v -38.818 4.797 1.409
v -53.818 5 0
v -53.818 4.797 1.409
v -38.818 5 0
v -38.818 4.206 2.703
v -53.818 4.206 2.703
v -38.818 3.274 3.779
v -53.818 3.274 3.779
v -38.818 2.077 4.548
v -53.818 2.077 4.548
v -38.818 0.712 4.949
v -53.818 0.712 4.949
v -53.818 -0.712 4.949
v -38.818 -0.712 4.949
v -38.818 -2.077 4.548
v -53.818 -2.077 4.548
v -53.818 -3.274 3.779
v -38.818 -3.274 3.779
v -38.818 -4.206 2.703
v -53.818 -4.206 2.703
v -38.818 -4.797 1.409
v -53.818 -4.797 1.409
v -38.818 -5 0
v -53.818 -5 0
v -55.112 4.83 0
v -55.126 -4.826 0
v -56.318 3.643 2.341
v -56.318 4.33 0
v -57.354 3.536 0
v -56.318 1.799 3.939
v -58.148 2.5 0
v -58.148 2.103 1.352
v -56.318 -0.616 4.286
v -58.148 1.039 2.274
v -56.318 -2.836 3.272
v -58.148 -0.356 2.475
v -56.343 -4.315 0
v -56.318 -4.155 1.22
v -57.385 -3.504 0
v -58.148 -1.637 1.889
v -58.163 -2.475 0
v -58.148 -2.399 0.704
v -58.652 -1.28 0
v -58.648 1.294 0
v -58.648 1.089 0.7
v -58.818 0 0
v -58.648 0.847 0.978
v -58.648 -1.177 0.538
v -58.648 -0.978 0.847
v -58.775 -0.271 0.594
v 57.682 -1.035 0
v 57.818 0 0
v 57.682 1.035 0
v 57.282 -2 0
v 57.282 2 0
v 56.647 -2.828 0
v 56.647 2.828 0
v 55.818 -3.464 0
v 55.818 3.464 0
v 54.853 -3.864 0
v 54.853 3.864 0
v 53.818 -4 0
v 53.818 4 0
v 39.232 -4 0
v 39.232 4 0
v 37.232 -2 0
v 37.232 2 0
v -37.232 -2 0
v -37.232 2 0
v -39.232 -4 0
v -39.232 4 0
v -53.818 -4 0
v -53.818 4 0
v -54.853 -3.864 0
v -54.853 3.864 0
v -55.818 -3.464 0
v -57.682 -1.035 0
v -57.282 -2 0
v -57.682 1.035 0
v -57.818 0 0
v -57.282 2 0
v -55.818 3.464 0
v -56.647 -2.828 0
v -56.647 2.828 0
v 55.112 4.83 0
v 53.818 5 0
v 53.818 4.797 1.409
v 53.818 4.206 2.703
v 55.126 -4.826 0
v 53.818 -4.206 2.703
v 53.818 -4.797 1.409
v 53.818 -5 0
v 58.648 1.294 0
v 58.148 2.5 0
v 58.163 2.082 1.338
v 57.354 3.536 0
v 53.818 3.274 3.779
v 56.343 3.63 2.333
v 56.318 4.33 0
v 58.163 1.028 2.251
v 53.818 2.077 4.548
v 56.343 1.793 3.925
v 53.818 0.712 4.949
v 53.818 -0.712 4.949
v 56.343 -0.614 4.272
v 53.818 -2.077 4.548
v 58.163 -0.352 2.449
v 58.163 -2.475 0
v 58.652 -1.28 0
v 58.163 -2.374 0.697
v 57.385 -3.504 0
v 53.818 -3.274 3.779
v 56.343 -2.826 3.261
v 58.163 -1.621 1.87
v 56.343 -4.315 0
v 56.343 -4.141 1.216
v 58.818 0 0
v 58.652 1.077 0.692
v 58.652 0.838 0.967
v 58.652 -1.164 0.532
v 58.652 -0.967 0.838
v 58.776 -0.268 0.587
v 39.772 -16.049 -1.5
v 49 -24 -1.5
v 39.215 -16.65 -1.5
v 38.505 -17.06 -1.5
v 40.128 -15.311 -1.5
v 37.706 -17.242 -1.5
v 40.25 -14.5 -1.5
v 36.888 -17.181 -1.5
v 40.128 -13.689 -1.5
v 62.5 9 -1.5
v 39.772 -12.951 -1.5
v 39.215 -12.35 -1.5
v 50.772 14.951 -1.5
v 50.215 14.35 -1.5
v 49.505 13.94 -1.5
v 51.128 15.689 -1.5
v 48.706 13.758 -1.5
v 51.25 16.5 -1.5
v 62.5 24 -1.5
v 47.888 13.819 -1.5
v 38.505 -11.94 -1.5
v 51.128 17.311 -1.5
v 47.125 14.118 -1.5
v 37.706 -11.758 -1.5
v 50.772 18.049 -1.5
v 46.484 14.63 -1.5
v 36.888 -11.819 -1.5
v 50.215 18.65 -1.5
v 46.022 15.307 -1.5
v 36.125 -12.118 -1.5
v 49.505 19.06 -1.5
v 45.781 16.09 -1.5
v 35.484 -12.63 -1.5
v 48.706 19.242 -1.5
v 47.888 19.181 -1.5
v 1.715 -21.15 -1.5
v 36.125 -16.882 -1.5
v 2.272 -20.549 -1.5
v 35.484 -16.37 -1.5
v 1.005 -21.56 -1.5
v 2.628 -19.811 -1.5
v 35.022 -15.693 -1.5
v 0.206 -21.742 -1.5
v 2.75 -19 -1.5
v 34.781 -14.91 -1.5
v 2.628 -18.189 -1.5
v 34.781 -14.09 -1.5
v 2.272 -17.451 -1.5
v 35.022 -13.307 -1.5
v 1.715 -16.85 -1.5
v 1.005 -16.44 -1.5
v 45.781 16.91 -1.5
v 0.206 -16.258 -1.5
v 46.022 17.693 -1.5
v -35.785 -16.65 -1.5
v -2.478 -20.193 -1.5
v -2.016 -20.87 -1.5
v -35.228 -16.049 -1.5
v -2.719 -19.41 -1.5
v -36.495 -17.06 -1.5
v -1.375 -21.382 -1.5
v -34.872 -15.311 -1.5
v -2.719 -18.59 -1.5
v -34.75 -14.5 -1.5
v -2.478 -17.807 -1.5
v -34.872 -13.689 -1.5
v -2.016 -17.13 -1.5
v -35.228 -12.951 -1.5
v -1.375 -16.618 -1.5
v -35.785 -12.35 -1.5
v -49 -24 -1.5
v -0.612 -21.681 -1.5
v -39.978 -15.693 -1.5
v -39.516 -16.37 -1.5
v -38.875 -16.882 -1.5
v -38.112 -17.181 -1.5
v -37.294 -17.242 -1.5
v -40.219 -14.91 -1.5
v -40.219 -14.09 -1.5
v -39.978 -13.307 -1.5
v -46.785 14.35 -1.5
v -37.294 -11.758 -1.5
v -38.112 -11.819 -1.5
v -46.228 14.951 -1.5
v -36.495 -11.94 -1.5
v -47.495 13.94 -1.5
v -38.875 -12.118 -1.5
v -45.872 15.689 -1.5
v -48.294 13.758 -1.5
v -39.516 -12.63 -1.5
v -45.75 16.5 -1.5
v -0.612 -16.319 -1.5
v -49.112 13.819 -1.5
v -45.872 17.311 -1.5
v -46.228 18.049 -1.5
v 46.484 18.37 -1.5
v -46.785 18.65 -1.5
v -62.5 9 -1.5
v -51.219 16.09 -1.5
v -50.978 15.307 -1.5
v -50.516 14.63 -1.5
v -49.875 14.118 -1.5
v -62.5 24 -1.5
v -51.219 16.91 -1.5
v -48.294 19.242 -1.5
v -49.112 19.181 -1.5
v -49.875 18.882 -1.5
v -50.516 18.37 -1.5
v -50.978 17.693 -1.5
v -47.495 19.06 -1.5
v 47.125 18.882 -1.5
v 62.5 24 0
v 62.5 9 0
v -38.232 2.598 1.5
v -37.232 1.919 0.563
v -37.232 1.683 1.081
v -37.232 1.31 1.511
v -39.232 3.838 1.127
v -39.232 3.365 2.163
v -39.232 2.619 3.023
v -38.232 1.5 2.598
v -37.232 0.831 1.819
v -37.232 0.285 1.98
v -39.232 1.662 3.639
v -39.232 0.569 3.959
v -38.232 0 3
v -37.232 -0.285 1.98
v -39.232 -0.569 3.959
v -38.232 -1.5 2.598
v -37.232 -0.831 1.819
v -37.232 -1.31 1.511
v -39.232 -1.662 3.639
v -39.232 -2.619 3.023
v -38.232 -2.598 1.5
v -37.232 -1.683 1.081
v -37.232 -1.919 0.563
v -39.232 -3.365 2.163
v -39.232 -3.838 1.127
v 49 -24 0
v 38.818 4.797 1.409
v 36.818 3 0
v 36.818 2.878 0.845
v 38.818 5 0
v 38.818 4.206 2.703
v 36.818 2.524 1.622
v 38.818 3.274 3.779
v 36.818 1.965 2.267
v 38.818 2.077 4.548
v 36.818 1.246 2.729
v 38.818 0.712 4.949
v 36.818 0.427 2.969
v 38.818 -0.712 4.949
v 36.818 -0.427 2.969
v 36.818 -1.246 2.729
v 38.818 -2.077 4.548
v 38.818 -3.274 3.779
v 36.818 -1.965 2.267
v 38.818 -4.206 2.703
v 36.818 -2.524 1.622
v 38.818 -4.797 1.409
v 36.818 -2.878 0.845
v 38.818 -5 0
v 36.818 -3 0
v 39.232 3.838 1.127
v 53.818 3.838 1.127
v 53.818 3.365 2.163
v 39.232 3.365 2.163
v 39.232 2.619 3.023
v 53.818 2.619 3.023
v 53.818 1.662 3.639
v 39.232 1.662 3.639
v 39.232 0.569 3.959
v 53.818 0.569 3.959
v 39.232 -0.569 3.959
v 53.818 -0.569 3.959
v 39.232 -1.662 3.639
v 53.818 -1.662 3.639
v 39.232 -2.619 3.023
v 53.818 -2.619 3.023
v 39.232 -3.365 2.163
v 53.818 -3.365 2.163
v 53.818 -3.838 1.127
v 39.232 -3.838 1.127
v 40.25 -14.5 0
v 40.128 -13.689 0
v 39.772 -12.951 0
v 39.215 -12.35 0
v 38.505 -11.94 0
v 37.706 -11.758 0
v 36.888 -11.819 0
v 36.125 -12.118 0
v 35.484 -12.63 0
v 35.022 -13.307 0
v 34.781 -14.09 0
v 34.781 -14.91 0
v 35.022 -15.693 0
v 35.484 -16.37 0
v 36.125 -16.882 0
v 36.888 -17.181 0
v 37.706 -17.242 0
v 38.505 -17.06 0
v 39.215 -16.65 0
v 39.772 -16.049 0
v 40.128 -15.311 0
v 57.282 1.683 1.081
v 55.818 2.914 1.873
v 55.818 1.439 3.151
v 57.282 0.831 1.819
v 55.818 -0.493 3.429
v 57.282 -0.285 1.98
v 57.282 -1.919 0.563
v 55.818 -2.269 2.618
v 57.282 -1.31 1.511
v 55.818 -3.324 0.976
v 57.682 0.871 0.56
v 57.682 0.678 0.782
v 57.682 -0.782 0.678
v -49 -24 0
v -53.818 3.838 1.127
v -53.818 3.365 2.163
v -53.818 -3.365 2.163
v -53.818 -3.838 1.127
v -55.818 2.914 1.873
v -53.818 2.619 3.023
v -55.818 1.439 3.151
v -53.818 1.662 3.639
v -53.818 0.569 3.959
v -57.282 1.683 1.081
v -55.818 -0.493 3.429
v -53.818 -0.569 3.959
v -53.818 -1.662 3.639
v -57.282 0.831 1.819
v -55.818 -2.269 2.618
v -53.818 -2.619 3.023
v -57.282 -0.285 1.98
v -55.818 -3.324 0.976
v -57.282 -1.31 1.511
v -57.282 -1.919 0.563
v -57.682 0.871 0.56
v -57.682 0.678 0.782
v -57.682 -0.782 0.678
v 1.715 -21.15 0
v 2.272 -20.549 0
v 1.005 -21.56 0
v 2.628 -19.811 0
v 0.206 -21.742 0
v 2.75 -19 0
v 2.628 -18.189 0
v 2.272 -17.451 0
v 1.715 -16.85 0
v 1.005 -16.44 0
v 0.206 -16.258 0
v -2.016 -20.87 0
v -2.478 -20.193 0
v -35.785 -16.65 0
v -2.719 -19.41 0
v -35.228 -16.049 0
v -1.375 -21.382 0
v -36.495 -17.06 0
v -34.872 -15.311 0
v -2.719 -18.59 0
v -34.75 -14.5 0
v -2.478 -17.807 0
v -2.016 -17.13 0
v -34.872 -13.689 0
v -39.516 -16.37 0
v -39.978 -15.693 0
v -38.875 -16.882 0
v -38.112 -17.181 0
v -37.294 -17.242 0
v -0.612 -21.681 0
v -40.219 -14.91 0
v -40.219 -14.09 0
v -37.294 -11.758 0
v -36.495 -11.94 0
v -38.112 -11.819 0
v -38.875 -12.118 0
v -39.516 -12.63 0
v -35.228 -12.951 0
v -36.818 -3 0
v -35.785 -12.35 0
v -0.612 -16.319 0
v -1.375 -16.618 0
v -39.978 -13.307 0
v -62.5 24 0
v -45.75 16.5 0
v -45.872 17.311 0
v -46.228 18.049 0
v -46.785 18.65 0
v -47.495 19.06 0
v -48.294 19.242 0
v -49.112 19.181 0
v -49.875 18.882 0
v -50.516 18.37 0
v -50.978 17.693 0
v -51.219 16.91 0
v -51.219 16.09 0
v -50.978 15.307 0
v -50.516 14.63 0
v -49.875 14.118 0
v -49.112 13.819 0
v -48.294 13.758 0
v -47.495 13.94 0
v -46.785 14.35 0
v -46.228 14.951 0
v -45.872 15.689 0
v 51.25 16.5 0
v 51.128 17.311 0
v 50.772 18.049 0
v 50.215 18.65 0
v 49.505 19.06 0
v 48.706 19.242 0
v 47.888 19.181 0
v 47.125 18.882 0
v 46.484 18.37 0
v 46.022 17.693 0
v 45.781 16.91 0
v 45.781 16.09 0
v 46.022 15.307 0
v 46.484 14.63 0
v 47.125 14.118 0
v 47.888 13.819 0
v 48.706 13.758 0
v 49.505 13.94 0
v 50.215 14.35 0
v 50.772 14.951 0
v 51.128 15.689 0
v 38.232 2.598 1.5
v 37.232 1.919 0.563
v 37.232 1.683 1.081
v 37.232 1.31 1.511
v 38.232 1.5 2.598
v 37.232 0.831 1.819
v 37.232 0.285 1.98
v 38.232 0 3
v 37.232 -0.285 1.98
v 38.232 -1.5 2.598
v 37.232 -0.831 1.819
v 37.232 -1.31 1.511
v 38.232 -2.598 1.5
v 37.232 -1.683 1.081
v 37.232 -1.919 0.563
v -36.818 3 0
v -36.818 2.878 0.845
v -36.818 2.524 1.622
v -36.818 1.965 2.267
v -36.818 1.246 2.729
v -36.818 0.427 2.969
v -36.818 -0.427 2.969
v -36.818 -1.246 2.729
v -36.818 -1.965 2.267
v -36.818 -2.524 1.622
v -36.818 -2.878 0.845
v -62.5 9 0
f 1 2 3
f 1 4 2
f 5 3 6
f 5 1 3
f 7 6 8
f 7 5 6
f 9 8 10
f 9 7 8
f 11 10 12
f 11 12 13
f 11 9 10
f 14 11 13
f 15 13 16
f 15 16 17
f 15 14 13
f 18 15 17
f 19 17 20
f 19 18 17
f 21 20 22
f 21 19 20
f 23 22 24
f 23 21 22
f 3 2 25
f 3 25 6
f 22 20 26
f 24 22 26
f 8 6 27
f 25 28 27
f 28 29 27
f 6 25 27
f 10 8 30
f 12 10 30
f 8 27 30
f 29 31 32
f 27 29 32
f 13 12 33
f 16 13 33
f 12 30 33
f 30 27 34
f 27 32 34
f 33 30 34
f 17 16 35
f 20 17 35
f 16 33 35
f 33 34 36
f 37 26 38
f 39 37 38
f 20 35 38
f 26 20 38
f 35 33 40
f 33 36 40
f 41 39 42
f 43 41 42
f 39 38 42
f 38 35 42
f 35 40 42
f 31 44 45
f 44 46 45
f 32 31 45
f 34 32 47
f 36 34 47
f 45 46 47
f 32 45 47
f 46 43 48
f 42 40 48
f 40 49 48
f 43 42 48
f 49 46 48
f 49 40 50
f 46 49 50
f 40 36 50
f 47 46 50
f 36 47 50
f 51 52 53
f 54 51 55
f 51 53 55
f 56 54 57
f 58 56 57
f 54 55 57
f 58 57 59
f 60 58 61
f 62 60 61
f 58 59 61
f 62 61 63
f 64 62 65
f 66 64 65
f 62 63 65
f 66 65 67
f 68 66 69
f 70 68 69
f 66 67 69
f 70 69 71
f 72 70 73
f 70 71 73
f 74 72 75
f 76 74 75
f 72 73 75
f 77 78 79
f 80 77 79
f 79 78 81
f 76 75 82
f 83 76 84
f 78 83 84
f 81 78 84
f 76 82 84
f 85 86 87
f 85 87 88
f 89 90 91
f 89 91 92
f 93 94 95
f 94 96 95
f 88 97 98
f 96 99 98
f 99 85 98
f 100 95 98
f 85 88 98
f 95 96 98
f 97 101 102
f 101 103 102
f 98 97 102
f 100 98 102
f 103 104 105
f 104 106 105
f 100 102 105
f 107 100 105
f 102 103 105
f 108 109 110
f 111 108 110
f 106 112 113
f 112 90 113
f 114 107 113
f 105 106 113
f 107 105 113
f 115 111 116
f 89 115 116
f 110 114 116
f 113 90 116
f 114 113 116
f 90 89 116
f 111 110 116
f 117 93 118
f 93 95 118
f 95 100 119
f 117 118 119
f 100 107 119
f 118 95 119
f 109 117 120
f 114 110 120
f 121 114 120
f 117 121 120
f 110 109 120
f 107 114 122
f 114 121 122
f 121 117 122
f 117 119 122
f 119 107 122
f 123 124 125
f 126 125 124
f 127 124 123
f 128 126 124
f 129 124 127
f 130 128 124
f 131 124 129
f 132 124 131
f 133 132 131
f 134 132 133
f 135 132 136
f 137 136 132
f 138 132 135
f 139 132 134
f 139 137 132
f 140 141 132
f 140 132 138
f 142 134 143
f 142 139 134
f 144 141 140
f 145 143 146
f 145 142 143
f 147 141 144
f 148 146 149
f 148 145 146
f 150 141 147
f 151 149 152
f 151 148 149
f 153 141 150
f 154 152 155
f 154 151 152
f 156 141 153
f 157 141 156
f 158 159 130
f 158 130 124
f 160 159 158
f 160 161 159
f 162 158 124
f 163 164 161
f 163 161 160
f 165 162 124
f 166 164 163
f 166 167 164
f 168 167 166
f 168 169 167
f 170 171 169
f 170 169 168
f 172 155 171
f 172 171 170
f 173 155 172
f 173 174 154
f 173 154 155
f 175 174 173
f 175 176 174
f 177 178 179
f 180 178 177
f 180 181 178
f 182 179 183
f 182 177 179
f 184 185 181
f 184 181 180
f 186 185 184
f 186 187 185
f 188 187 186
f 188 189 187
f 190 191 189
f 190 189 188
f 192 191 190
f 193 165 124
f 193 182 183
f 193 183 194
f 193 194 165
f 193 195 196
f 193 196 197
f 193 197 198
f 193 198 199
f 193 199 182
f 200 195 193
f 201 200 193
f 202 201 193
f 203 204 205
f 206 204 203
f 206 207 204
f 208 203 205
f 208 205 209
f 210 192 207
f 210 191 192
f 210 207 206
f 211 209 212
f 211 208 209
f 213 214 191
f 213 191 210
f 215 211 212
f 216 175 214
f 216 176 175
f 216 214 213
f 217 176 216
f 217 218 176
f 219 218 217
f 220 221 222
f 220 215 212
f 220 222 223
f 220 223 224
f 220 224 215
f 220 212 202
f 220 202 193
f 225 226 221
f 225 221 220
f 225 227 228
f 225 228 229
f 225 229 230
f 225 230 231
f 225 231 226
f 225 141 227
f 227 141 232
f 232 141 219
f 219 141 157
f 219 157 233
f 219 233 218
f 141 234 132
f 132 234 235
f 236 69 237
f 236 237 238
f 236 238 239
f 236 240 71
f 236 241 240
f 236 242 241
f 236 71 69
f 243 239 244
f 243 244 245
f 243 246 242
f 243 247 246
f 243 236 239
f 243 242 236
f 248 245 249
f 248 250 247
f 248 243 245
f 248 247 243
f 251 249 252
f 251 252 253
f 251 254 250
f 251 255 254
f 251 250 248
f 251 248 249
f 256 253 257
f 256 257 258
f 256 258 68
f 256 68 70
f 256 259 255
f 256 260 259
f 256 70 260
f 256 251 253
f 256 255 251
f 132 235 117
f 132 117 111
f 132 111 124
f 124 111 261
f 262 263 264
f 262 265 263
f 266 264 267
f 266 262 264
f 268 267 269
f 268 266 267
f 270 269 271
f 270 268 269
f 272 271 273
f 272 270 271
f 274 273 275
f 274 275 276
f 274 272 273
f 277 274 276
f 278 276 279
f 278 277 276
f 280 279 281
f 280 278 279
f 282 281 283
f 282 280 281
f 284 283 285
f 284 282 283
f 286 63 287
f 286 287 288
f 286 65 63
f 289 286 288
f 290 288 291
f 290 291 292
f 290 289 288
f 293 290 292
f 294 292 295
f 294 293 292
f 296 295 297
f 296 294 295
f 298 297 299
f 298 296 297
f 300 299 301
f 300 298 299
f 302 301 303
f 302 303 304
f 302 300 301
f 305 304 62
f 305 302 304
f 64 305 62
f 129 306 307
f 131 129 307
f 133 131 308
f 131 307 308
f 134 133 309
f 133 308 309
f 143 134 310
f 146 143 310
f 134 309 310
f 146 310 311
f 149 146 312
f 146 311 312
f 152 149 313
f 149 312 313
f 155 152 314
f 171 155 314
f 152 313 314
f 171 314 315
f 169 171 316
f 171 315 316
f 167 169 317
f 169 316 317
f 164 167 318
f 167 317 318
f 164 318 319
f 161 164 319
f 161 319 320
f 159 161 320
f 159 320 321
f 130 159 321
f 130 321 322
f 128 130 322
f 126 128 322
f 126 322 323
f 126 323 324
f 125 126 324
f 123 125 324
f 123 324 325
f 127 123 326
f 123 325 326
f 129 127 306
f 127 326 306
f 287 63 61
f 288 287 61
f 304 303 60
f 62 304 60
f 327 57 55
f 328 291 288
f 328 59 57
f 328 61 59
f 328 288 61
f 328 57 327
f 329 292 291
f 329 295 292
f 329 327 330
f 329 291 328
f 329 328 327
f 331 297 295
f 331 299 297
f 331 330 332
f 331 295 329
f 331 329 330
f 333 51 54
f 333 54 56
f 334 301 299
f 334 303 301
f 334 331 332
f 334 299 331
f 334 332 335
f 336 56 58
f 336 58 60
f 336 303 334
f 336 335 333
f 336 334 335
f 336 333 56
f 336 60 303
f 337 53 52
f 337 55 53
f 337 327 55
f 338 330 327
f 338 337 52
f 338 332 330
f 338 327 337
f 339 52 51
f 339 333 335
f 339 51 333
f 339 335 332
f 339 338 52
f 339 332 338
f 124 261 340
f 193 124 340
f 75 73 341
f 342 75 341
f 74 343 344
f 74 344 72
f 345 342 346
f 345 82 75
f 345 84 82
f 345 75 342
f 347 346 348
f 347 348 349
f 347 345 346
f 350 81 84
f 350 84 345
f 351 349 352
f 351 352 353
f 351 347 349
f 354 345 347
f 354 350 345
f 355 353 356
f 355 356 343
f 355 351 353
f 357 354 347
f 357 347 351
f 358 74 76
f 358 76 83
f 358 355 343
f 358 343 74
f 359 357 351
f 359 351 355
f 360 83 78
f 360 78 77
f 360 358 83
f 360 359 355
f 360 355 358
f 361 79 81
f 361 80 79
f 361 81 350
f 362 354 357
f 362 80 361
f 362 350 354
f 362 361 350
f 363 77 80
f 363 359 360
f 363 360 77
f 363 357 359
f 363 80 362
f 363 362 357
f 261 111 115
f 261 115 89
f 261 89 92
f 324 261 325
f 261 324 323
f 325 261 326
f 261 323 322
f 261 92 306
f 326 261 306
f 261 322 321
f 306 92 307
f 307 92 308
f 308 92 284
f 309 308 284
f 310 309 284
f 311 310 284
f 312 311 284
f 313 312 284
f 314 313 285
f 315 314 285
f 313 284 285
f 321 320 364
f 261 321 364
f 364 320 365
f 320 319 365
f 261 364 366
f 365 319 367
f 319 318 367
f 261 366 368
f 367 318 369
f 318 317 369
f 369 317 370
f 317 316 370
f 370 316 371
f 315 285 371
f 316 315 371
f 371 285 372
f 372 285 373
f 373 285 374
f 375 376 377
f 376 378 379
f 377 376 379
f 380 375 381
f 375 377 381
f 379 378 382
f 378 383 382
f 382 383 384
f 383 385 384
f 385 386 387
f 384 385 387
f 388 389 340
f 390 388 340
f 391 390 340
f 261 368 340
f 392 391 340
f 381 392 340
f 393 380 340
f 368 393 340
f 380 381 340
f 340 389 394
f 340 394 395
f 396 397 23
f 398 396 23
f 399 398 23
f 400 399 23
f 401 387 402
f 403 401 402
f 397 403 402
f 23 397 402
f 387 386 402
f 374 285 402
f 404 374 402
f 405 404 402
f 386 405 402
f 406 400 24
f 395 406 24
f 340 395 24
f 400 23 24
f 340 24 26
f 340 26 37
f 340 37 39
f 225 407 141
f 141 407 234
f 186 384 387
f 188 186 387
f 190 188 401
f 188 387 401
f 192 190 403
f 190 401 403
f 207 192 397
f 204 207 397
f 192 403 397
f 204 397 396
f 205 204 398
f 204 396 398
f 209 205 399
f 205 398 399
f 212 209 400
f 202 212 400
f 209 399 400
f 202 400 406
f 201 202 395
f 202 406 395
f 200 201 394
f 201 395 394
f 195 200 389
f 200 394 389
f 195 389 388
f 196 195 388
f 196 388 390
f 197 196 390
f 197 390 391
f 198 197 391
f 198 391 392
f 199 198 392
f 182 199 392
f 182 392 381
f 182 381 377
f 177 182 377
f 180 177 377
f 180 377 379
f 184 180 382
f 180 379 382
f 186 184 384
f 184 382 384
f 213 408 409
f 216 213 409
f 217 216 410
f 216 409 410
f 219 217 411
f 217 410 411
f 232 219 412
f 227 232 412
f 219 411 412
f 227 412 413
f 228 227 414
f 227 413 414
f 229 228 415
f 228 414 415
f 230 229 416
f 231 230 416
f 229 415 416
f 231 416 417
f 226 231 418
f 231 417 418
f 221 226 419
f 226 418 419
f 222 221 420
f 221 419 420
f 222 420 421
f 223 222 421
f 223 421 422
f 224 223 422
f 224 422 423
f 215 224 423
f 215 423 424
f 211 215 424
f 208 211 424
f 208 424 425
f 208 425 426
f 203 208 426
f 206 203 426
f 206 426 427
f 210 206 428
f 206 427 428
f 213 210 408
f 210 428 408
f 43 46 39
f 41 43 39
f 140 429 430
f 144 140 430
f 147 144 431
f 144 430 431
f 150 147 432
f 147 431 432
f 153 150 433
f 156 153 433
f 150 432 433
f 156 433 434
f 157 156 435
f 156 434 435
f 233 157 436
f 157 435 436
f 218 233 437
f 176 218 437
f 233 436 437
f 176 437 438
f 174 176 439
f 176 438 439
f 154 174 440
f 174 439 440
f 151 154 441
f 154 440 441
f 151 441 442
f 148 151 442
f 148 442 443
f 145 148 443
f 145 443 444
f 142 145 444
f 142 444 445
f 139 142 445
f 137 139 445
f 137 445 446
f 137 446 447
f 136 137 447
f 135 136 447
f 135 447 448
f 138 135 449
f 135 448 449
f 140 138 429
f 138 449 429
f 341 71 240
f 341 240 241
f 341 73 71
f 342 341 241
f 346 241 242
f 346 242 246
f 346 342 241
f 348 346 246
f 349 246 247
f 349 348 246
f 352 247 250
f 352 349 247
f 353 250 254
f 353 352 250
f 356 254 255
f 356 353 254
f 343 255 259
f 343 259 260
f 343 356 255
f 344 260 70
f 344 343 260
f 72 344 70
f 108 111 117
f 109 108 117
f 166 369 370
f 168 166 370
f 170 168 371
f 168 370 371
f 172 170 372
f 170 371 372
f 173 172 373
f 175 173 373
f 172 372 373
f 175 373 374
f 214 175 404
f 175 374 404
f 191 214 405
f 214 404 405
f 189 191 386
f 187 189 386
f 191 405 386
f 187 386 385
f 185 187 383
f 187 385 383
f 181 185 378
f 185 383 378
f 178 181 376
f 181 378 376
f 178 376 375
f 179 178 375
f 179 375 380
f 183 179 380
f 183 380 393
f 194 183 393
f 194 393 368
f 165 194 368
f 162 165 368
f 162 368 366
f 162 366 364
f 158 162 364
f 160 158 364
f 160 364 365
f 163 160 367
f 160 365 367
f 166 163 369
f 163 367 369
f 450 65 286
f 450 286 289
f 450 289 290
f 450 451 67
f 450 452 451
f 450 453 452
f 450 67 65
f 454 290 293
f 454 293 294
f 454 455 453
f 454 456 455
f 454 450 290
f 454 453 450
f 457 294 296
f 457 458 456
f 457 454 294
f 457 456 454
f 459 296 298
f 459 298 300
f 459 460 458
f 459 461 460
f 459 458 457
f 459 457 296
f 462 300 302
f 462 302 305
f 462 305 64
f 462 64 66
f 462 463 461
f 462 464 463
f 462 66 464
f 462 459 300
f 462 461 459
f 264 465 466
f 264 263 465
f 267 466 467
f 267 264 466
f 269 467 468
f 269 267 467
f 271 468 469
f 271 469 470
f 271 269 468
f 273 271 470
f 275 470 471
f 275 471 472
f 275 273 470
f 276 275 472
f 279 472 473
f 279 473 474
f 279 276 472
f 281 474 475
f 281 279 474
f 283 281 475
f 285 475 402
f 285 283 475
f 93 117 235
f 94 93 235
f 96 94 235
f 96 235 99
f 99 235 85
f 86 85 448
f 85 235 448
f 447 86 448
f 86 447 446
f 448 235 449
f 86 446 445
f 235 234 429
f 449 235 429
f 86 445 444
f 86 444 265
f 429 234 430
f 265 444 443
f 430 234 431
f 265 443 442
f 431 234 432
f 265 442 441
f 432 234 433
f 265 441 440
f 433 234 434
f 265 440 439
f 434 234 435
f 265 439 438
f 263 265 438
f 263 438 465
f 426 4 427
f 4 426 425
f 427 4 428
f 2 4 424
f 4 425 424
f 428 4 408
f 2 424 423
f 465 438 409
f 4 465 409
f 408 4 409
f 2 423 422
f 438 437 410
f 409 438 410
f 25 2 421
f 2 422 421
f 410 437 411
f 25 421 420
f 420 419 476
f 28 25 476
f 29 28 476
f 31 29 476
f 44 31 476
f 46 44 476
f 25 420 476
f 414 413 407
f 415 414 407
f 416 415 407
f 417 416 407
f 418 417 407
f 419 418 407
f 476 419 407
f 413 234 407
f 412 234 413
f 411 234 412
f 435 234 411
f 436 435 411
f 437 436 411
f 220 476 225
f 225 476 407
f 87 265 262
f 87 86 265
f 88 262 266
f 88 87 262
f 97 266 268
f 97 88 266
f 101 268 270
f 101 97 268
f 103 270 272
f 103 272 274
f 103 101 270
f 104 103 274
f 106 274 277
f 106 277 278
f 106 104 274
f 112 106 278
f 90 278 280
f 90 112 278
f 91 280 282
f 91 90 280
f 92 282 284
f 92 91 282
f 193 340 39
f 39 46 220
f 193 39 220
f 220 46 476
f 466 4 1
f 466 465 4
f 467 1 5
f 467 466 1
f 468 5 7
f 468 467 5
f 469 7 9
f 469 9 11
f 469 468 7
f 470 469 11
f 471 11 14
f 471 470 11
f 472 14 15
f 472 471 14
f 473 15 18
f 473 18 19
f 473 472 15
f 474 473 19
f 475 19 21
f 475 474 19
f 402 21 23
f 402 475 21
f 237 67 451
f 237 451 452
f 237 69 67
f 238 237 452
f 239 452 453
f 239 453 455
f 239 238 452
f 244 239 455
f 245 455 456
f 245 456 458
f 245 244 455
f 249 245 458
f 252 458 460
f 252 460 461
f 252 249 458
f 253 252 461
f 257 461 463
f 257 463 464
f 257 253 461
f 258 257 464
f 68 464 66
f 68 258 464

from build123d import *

# Parameters (mm, degrees)
SKETCH_R         = 2.75
PAD_DEPTH        = 1.5
REVOLUTION_ANGLE = 180


with BuildPart() as part:
    # Sketch → Pad (new body)
    with BuildSketch(Plane.XY):
        Polygon((-62.5, 24), (62.5, 24), (62.5, 9), (49, -24), (-49, -24), (-62.5, 9), align=None)
        with Locations((0, -19)):
            Circle(SKETCH_R, mode=Mode.SUBTRACT)
        with Locations((37.5, -14.5)):
            Circle(SKETCH_R, mode=Mode.SUBTRACT)
        with Locations((-37.5, -14.5)):
            Circle(SKETCH_R, mode=Mode.SUBTRACT)
        with Locations((-48.5, 16.5)):
            Circle(SKETCH_R, mode=Mode.SUBTRACT)
        with Locations((48.5, 16.5)):
            Circle(SKETCH_R, mode=Mode.SUBTRACT)
    extrude(amount=-PAD_DEPTH)

    # Sketch001 → Revolution (revolve)
    with BuildSketch(Plane.XY):
        with BuildLine():
            Line((-53.818182, 5), (-38.818182, 5))
            Line((-38.818182, 5), (-36.818182, 3))
            Line((-36.818182, 3), (36.818182, 3))
            Line((36.818182, 3), (38.818182, 5))
            Line((38.818182, 5), (53.818182, 5))
            ThreePointArc((58.818182, 0), (57.353716, 3.535534), (53.818182, 5))
            Line((57.818182, 0), (58.818182, 0))
            ThreePointArc((57.818182, 0), (56.646609, 2.828427), (53.818182, 4))
            Line((53.818182, 4), (39.232395, 4))
            Line((39.232395, 4), (37.232395, 2))
            Line((37.232395, 2), (-37.232395, 2))
            Line((-37.232395, 2), (-39.232395, 4))
            Line((-39.232395, 4), (-53.818182, 4))
            ThreePointArc((-53.818182, 4), (-56.646609, 2.828427), (-57.818182, 0))
            Line((-58.818182, 0), (-57.818182, 0))
            ThreePointArc((-53.818182, 5), (-57.353716, 3.535534), (-58.818182, 0))
        make_face()
    revolve(axis=Axis((0, 0, 0), (1, 0, 0)), revolution_arc=REVOLUTION_ANGLE)


solid = part.part
